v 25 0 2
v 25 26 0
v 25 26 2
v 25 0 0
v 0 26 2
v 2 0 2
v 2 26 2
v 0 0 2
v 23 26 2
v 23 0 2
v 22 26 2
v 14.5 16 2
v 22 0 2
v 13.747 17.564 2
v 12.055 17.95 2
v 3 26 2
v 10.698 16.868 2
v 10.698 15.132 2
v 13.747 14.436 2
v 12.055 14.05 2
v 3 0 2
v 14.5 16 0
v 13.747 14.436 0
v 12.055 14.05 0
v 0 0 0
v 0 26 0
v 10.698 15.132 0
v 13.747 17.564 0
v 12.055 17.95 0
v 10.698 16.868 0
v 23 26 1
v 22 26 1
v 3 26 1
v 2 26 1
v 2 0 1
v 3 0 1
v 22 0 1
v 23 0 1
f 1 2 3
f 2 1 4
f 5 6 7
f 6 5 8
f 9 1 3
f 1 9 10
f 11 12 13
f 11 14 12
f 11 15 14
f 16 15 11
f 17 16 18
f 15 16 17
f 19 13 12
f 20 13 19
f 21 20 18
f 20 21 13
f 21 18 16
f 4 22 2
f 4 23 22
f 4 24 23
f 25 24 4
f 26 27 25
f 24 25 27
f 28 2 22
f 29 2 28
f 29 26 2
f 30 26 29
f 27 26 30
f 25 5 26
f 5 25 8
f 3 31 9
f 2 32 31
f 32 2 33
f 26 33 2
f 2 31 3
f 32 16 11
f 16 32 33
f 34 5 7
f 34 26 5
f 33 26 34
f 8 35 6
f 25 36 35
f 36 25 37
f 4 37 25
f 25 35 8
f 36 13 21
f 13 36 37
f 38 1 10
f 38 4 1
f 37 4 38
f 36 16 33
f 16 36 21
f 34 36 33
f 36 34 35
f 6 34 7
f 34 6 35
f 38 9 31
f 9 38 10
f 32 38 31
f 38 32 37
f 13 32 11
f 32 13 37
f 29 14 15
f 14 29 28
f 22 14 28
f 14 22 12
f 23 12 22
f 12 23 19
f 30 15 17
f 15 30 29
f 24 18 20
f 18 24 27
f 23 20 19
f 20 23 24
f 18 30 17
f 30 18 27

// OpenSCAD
difference() {
	cube([25,26,2]);
   translate ([2,0,1]) cube([1,26,1]);
   translate ([22,0,1]) cube([1,26,1]);
   translate ([12.5,16,0]) cylinder(r=2, h=2);
}
